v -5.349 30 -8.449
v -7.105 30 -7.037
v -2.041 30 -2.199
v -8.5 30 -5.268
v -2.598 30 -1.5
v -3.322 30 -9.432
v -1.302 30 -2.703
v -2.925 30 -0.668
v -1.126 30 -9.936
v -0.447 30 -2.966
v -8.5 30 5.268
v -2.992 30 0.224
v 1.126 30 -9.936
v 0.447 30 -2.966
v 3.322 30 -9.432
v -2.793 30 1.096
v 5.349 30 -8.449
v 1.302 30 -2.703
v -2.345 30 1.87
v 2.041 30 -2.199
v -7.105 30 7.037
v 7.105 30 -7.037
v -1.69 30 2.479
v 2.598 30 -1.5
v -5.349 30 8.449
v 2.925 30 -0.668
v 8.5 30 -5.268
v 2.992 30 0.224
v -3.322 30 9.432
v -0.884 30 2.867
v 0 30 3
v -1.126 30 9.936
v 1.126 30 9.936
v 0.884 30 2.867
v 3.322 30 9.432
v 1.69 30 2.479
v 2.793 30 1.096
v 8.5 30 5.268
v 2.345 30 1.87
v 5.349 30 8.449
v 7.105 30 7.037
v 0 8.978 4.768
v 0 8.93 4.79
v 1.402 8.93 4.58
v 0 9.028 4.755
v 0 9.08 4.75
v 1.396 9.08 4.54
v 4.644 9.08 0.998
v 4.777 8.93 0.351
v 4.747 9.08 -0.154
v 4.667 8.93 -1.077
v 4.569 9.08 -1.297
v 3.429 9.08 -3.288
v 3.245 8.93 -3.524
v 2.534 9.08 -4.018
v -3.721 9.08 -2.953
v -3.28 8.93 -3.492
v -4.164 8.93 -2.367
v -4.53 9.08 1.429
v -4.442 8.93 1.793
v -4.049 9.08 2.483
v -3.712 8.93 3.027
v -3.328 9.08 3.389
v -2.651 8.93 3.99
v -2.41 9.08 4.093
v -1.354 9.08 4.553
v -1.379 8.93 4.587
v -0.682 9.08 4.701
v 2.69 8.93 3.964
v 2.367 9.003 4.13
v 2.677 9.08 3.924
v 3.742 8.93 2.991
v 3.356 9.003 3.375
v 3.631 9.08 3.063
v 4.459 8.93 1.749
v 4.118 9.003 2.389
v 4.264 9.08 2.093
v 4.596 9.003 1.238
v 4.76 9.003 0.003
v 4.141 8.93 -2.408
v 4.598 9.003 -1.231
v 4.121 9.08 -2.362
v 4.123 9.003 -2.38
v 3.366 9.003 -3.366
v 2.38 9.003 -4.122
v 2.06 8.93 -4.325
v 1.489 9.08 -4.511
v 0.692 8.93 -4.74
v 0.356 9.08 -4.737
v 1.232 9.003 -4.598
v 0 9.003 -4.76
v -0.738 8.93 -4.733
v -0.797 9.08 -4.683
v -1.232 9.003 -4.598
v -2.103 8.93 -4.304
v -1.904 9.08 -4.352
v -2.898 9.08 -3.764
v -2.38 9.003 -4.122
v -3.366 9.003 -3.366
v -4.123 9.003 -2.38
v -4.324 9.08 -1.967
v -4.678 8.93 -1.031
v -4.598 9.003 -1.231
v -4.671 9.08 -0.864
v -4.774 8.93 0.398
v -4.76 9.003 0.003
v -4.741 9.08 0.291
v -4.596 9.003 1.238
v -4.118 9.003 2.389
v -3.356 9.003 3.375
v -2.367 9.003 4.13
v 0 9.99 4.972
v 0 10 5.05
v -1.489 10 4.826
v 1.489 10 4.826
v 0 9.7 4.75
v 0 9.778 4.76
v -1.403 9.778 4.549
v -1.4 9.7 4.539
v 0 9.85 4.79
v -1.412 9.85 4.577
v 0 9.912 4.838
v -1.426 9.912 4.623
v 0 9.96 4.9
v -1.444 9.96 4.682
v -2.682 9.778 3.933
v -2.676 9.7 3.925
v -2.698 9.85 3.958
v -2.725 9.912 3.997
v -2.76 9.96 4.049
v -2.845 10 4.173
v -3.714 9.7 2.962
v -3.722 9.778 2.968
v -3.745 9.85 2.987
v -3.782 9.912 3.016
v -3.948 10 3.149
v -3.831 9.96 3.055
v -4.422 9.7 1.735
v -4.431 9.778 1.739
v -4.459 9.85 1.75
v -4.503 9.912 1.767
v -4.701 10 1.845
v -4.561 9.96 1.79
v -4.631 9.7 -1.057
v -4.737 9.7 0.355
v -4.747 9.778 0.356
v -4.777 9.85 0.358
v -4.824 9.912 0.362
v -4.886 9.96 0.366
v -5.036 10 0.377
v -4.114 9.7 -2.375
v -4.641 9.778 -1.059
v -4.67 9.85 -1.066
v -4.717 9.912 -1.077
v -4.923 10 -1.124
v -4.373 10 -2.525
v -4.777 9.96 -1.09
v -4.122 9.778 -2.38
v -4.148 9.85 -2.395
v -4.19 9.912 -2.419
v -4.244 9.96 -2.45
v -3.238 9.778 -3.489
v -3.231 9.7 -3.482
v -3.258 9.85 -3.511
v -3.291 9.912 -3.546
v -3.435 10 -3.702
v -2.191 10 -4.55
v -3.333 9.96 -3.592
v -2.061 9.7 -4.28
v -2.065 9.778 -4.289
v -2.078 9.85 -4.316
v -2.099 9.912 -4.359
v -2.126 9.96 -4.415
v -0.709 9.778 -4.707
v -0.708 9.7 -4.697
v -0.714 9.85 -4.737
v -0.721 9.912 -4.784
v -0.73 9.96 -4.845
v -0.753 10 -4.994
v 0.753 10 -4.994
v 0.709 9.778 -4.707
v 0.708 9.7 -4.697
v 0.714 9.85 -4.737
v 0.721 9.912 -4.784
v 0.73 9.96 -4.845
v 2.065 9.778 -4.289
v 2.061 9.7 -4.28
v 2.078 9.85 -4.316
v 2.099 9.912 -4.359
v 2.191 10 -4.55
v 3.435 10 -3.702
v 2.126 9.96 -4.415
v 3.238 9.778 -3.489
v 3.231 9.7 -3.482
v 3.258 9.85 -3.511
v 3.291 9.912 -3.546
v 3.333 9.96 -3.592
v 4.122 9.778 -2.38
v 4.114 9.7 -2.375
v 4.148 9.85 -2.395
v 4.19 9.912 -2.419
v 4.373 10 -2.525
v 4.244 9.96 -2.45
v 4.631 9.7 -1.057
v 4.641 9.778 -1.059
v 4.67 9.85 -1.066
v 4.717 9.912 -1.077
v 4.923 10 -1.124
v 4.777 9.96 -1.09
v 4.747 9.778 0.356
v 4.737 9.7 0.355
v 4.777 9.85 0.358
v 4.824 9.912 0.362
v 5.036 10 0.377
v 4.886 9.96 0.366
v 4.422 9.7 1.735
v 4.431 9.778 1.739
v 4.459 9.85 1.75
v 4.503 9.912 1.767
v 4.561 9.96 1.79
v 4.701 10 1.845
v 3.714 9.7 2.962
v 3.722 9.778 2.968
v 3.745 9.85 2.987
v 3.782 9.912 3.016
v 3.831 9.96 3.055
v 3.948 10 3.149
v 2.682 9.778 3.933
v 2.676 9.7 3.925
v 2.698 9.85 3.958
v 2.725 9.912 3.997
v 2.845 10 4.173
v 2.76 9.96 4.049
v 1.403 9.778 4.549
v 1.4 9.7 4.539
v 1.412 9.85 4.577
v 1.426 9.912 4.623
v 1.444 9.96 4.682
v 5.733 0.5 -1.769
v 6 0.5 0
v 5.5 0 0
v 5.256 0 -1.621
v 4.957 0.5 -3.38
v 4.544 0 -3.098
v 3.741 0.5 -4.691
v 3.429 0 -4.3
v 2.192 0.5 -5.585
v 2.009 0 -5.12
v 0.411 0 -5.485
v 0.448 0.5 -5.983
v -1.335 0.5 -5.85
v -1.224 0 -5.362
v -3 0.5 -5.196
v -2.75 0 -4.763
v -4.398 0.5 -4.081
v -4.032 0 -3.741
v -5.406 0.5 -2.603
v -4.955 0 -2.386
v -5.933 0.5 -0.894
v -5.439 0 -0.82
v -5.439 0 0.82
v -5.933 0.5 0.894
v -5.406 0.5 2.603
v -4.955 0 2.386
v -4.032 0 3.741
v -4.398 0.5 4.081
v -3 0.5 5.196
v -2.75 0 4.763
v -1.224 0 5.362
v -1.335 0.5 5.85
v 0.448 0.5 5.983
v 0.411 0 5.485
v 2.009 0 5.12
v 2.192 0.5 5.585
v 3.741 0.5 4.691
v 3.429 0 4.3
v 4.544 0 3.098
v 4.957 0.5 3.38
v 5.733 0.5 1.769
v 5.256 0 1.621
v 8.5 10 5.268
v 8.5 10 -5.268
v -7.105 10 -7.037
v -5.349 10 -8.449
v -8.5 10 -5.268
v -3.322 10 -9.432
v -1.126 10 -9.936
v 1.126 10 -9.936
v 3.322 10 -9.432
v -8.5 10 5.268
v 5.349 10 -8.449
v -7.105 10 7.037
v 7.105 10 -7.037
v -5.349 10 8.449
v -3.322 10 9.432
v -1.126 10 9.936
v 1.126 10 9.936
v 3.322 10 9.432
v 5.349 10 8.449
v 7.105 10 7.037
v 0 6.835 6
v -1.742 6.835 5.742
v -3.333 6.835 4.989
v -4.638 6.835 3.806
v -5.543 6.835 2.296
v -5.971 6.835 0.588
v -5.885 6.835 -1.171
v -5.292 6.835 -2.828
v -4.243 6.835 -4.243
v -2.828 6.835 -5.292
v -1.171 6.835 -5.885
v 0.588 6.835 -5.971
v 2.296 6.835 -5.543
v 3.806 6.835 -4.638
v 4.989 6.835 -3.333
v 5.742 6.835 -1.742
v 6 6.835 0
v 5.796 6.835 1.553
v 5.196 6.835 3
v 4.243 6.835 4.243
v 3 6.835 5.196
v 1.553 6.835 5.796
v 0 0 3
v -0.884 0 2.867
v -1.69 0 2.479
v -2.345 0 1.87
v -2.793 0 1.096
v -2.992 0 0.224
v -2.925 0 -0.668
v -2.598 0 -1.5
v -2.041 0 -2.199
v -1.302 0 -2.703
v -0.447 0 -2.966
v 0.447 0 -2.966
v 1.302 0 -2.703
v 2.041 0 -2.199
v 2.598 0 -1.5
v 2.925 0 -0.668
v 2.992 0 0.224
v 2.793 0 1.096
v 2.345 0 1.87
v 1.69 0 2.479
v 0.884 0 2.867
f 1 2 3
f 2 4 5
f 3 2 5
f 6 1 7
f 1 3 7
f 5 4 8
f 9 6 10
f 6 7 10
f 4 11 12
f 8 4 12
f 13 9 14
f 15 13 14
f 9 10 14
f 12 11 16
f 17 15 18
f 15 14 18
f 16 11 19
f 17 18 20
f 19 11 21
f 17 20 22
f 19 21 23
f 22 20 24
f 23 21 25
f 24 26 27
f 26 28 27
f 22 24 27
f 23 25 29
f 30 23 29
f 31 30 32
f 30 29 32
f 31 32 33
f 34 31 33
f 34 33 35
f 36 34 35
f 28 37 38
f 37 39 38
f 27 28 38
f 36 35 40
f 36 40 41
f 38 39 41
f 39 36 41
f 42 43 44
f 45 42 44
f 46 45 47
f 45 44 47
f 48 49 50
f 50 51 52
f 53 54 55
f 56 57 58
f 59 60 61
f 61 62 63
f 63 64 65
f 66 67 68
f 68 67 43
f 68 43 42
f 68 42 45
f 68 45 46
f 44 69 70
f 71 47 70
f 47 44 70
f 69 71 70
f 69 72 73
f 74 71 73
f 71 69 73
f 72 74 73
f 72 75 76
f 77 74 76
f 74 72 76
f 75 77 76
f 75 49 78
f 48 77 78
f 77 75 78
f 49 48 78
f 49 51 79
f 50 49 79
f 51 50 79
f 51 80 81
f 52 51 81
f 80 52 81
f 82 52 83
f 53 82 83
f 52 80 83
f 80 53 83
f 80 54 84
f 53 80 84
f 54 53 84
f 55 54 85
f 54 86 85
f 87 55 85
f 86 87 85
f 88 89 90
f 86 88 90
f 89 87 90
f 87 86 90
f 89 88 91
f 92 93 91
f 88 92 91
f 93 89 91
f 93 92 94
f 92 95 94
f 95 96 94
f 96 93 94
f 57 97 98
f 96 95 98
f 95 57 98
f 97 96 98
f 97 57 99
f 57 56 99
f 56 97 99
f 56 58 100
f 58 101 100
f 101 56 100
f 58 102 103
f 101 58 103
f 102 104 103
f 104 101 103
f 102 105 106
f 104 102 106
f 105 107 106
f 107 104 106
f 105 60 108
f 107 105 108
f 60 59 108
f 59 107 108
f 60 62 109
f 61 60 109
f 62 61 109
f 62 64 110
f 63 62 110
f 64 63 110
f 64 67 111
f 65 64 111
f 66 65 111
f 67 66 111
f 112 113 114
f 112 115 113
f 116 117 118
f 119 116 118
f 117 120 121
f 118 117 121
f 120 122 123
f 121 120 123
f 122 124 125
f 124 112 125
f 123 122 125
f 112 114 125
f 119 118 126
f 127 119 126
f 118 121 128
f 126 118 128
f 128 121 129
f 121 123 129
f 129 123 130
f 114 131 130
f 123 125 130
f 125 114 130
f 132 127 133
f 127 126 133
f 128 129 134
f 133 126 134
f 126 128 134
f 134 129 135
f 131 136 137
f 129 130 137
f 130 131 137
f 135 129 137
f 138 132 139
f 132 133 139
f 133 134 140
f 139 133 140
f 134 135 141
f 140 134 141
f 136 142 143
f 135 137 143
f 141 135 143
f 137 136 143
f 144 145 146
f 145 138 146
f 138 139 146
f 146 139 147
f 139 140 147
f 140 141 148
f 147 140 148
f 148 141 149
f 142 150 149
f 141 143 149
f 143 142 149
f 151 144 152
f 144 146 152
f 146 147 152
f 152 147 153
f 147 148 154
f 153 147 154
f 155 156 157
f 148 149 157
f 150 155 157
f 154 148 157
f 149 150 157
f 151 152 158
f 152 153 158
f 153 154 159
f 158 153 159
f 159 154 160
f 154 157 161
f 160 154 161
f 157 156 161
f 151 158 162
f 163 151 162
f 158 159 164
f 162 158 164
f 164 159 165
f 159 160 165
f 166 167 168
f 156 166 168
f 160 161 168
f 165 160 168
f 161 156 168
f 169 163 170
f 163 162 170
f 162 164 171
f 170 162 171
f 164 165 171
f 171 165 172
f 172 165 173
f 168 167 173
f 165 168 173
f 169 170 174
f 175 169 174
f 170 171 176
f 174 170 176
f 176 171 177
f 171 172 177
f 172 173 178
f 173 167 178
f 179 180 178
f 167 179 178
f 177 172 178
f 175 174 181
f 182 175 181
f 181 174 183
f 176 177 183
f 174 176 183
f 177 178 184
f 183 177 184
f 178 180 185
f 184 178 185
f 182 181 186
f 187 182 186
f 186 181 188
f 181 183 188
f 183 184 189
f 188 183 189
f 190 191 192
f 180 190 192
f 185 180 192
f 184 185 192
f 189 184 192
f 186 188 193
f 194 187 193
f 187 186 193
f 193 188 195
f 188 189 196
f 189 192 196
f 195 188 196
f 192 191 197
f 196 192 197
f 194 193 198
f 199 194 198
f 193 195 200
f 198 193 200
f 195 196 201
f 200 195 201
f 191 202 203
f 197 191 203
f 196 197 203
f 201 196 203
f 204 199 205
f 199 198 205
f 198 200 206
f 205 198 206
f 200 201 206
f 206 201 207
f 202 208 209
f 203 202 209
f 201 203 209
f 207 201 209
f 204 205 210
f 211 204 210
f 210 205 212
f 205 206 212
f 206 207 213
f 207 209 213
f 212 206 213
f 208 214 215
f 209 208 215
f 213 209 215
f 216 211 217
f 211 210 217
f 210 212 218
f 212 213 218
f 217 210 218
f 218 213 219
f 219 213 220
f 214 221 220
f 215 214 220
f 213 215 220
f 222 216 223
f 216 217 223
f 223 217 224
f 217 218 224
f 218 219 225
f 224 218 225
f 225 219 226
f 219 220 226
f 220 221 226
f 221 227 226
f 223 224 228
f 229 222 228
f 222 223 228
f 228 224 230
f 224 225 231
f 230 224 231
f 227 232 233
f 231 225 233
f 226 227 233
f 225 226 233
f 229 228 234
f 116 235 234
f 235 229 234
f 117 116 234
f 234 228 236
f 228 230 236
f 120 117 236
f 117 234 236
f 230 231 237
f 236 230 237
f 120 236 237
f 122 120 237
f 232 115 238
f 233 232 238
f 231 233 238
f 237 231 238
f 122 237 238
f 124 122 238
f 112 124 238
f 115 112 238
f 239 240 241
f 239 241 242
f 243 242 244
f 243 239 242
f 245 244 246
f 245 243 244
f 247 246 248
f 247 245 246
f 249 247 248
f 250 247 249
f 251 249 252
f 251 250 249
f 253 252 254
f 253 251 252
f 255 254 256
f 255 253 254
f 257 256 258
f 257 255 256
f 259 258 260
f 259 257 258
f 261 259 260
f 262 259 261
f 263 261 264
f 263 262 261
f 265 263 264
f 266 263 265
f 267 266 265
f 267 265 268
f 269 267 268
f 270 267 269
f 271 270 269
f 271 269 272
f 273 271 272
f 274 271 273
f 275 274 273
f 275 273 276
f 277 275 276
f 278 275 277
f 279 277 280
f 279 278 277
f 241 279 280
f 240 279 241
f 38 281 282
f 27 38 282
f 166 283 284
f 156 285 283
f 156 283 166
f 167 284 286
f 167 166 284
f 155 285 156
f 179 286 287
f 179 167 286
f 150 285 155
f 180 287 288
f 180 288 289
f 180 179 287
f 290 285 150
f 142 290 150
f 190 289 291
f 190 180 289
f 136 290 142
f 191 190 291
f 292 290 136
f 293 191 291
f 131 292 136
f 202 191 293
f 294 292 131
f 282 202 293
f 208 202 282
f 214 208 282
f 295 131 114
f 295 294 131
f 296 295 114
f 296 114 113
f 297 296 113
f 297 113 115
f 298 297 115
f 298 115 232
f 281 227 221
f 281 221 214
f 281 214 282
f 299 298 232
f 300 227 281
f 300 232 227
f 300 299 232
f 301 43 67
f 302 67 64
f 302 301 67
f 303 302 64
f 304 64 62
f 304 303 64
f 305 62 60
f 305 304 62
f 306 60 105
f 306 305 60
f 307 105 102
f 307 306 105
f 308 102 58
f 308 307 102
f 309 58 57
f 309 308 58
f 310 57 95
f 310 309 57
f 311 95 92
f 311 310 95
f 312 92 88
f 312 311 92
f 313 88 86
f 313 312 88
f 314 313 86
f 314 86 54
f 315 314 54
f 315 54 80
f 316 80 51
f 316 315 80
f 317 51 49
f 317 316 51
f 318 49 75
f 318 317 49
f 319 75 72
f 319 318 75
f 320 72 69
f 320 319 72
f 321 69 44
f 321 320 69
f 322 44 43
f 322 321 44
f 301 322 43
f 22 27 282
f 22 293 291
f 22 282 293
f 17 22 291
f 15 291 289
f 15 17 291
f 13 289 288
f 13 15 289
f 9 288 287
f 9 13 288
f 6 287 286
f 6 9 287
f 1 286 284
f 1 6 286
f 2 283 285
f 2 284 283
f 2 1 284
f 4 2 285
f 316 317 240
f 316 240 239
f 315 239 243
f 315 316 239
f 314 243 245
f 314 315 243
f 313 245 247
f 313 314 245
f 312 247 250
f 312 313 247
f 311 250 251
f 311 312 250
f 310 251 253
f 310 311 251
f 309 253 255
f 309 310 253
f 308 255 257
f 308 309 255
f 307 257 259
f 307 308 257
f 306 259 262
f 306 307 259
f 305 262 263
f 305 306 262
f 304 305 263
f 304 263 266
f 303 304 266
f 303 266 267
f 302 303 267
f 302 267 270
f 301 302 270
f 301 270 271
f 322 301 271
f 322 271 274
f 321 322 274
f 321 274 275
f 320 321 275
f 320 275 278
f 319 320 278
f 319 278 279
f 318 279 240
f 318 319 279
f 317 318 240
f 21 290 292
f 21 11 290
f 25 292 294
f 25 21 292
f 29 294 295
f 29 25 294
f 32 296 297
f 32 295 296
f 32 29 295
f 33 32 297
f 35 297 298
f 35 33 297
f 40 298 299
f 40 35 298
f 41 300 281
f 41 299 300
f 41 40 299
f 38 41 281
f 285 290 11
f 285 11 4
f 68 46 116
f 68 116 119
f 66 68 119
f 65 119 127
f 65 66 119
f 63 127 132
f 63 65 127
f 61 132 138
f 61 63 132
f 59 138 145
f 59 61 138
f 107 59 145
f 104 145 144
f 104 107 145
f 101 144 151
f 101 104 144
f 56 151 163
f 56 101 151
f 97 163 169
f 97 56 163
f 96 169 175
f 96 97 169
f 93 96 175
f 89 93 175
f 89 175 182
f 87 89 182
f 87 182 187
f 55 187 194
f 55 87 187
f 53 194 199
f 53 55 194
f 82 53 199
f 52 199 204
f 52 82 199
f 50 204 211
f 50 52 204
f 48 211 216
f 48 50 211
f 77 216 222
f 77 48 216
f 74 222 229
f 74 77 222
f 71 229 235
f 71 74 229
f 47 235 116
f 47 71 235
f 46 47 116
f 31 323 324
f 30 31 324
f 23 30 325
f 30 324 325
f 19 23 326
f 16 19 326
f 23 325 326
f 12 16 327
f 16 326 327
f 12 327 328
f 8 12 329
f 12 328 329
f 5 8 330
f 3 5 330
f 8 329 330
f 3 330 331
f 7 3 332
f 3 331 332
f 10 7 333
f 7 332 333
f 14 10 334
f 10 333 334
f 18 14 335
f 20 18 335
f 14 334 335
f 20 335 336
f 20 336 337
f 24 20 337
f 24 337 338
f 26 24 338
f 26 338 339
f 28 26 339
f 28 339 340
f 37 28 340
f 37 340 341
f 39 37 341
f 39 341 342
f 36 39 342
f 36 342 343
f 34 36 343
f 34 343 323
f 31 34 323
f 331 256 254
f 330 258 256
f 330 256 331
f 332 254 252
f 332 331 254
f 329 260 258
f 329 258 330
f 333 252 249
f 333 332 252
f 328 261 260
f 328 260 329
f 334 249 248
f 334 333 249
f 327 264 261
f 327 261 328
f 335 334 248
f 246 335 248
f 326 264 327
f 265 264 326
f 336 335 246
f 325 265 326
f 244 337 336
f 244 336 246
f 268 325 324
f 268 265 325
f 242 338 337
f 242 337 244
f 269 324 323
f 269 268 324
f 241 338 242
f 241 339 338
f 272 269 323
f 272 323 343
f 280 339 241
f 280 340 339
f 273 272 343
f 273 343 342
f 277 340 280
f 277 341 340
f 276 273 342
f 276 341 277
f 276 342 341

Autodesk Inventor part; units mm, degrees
ref_plane "YZ Plane" through (0, 0, 0) normal (1, 0, 0) x (0, 1, 0)
ref_plane "XZ Plane" through (0, 0, 0) normal (0, 1, 0) x (-1, 0, 0)
ref_plane "XY Plane" through (0, 0, 0) normal (0, 0, 1) x (1, 0, 0)
sketch "Skizze6" plane through (0, 0, 0) normal (0, 0, 1) x (1, 0, 0)
  line L0 (0, 0) -> (6, 0)
  line L1 (6, 0) -> (6, 10)
  line L2 (6, 10) -> (10, 10)
  line L3 (10, 10) -> (10, 30)
  line L4 (10, 30) -> (0, 30)
  line L5 (0, 30) -> (0, 0)
  line L6 (0, 30) -> (0, 0)
  dimension "d34" = 20
  dimension "d35" = 12
  dimension "d36" = 20
  dimension "d37" = 30
revolve "Umdrehung1" add sketch "Skizze6" angle 360 about axis through (0, 30, 0) along (0, -1, 0)
sketch "Skizze7" plane through (0, 30, 0) normal (0, 1, 0) x (1, 0, 0)
  circle A0 centre (0, 0) radius 10 projected
hole "Bohrung5" at (0, 30, 0) direction (0, -1, 0) diameter 6 end through all
sketch "Skizze8" plane through (0, 30, 0) normal (0, 1, 0) x (1, 0, 0)
  line L0 (-8.5, -5.2678) -> (-8.5, 5.2678)
  circle A0 centre (0, 0) radius 10 projected
  line L1 (0, 10) -> (0, -10)
  arc A1 (-8.5, 5.2678) -> (-8.5, -5.2678) centre (0, 0) ccw
  line L2 (8.5, -5.2678) -> (8.5, 5.2678)
  arc A2 (8.5, -5.2678) -> (8.5, 5.2678) centre (0, 0) ccw
  dimension "d46" = 17
extrude "Extrusion2" cut sketch "Skizze8" against normal up to surface (20 mm away) contours A0 L0 | L2 A0
chamfer "Fase1" distance 0.5 angle 45 1 edges at (-6, 0, 0)
sketch "Skizze9" plane through (0, 0, 0) normal (1, 0, 0) x (0, 1, 0)
  line L0 (10, 6) -> (0.5, 6) projected
  line L1 (10, -5.2678) -> (10, 5.2678) projected
  line L2 (10, 6) -> (10, 4.75)
  line L3 (10, 5.2678) -> (10, -5.2678) projected
  line L4 (10, 4.75) -> (9, 4.75)
  line L5 (9, 4.75) -> (6.8349, 6)
  line L6 (6.8349, 6) -> (10, 6)
  line L7 (0, 0) -> (30, 0)
  line L8 (30, 3) -> (30, -3) projected
  dimension "d52" = 9.5
  dimension "d53" = 30
  dimension "d54" = 1
revolve "Umdrehung2" cut sketch "Skizze9" angle 360 about axis through (0, 0, 0) along (0, 1, 0)
fillet "Rundung1" radius 0.3 2 edges at (0, 10, -4.75) (0, 9, -4.75)
thread "Gewinde1" size "M12x1.75" class "6g" standard "ANSI Metric M Profile" full length
properties part number "106.015.01_Justage_Vereinzelung" material "Aluminium 6061"
